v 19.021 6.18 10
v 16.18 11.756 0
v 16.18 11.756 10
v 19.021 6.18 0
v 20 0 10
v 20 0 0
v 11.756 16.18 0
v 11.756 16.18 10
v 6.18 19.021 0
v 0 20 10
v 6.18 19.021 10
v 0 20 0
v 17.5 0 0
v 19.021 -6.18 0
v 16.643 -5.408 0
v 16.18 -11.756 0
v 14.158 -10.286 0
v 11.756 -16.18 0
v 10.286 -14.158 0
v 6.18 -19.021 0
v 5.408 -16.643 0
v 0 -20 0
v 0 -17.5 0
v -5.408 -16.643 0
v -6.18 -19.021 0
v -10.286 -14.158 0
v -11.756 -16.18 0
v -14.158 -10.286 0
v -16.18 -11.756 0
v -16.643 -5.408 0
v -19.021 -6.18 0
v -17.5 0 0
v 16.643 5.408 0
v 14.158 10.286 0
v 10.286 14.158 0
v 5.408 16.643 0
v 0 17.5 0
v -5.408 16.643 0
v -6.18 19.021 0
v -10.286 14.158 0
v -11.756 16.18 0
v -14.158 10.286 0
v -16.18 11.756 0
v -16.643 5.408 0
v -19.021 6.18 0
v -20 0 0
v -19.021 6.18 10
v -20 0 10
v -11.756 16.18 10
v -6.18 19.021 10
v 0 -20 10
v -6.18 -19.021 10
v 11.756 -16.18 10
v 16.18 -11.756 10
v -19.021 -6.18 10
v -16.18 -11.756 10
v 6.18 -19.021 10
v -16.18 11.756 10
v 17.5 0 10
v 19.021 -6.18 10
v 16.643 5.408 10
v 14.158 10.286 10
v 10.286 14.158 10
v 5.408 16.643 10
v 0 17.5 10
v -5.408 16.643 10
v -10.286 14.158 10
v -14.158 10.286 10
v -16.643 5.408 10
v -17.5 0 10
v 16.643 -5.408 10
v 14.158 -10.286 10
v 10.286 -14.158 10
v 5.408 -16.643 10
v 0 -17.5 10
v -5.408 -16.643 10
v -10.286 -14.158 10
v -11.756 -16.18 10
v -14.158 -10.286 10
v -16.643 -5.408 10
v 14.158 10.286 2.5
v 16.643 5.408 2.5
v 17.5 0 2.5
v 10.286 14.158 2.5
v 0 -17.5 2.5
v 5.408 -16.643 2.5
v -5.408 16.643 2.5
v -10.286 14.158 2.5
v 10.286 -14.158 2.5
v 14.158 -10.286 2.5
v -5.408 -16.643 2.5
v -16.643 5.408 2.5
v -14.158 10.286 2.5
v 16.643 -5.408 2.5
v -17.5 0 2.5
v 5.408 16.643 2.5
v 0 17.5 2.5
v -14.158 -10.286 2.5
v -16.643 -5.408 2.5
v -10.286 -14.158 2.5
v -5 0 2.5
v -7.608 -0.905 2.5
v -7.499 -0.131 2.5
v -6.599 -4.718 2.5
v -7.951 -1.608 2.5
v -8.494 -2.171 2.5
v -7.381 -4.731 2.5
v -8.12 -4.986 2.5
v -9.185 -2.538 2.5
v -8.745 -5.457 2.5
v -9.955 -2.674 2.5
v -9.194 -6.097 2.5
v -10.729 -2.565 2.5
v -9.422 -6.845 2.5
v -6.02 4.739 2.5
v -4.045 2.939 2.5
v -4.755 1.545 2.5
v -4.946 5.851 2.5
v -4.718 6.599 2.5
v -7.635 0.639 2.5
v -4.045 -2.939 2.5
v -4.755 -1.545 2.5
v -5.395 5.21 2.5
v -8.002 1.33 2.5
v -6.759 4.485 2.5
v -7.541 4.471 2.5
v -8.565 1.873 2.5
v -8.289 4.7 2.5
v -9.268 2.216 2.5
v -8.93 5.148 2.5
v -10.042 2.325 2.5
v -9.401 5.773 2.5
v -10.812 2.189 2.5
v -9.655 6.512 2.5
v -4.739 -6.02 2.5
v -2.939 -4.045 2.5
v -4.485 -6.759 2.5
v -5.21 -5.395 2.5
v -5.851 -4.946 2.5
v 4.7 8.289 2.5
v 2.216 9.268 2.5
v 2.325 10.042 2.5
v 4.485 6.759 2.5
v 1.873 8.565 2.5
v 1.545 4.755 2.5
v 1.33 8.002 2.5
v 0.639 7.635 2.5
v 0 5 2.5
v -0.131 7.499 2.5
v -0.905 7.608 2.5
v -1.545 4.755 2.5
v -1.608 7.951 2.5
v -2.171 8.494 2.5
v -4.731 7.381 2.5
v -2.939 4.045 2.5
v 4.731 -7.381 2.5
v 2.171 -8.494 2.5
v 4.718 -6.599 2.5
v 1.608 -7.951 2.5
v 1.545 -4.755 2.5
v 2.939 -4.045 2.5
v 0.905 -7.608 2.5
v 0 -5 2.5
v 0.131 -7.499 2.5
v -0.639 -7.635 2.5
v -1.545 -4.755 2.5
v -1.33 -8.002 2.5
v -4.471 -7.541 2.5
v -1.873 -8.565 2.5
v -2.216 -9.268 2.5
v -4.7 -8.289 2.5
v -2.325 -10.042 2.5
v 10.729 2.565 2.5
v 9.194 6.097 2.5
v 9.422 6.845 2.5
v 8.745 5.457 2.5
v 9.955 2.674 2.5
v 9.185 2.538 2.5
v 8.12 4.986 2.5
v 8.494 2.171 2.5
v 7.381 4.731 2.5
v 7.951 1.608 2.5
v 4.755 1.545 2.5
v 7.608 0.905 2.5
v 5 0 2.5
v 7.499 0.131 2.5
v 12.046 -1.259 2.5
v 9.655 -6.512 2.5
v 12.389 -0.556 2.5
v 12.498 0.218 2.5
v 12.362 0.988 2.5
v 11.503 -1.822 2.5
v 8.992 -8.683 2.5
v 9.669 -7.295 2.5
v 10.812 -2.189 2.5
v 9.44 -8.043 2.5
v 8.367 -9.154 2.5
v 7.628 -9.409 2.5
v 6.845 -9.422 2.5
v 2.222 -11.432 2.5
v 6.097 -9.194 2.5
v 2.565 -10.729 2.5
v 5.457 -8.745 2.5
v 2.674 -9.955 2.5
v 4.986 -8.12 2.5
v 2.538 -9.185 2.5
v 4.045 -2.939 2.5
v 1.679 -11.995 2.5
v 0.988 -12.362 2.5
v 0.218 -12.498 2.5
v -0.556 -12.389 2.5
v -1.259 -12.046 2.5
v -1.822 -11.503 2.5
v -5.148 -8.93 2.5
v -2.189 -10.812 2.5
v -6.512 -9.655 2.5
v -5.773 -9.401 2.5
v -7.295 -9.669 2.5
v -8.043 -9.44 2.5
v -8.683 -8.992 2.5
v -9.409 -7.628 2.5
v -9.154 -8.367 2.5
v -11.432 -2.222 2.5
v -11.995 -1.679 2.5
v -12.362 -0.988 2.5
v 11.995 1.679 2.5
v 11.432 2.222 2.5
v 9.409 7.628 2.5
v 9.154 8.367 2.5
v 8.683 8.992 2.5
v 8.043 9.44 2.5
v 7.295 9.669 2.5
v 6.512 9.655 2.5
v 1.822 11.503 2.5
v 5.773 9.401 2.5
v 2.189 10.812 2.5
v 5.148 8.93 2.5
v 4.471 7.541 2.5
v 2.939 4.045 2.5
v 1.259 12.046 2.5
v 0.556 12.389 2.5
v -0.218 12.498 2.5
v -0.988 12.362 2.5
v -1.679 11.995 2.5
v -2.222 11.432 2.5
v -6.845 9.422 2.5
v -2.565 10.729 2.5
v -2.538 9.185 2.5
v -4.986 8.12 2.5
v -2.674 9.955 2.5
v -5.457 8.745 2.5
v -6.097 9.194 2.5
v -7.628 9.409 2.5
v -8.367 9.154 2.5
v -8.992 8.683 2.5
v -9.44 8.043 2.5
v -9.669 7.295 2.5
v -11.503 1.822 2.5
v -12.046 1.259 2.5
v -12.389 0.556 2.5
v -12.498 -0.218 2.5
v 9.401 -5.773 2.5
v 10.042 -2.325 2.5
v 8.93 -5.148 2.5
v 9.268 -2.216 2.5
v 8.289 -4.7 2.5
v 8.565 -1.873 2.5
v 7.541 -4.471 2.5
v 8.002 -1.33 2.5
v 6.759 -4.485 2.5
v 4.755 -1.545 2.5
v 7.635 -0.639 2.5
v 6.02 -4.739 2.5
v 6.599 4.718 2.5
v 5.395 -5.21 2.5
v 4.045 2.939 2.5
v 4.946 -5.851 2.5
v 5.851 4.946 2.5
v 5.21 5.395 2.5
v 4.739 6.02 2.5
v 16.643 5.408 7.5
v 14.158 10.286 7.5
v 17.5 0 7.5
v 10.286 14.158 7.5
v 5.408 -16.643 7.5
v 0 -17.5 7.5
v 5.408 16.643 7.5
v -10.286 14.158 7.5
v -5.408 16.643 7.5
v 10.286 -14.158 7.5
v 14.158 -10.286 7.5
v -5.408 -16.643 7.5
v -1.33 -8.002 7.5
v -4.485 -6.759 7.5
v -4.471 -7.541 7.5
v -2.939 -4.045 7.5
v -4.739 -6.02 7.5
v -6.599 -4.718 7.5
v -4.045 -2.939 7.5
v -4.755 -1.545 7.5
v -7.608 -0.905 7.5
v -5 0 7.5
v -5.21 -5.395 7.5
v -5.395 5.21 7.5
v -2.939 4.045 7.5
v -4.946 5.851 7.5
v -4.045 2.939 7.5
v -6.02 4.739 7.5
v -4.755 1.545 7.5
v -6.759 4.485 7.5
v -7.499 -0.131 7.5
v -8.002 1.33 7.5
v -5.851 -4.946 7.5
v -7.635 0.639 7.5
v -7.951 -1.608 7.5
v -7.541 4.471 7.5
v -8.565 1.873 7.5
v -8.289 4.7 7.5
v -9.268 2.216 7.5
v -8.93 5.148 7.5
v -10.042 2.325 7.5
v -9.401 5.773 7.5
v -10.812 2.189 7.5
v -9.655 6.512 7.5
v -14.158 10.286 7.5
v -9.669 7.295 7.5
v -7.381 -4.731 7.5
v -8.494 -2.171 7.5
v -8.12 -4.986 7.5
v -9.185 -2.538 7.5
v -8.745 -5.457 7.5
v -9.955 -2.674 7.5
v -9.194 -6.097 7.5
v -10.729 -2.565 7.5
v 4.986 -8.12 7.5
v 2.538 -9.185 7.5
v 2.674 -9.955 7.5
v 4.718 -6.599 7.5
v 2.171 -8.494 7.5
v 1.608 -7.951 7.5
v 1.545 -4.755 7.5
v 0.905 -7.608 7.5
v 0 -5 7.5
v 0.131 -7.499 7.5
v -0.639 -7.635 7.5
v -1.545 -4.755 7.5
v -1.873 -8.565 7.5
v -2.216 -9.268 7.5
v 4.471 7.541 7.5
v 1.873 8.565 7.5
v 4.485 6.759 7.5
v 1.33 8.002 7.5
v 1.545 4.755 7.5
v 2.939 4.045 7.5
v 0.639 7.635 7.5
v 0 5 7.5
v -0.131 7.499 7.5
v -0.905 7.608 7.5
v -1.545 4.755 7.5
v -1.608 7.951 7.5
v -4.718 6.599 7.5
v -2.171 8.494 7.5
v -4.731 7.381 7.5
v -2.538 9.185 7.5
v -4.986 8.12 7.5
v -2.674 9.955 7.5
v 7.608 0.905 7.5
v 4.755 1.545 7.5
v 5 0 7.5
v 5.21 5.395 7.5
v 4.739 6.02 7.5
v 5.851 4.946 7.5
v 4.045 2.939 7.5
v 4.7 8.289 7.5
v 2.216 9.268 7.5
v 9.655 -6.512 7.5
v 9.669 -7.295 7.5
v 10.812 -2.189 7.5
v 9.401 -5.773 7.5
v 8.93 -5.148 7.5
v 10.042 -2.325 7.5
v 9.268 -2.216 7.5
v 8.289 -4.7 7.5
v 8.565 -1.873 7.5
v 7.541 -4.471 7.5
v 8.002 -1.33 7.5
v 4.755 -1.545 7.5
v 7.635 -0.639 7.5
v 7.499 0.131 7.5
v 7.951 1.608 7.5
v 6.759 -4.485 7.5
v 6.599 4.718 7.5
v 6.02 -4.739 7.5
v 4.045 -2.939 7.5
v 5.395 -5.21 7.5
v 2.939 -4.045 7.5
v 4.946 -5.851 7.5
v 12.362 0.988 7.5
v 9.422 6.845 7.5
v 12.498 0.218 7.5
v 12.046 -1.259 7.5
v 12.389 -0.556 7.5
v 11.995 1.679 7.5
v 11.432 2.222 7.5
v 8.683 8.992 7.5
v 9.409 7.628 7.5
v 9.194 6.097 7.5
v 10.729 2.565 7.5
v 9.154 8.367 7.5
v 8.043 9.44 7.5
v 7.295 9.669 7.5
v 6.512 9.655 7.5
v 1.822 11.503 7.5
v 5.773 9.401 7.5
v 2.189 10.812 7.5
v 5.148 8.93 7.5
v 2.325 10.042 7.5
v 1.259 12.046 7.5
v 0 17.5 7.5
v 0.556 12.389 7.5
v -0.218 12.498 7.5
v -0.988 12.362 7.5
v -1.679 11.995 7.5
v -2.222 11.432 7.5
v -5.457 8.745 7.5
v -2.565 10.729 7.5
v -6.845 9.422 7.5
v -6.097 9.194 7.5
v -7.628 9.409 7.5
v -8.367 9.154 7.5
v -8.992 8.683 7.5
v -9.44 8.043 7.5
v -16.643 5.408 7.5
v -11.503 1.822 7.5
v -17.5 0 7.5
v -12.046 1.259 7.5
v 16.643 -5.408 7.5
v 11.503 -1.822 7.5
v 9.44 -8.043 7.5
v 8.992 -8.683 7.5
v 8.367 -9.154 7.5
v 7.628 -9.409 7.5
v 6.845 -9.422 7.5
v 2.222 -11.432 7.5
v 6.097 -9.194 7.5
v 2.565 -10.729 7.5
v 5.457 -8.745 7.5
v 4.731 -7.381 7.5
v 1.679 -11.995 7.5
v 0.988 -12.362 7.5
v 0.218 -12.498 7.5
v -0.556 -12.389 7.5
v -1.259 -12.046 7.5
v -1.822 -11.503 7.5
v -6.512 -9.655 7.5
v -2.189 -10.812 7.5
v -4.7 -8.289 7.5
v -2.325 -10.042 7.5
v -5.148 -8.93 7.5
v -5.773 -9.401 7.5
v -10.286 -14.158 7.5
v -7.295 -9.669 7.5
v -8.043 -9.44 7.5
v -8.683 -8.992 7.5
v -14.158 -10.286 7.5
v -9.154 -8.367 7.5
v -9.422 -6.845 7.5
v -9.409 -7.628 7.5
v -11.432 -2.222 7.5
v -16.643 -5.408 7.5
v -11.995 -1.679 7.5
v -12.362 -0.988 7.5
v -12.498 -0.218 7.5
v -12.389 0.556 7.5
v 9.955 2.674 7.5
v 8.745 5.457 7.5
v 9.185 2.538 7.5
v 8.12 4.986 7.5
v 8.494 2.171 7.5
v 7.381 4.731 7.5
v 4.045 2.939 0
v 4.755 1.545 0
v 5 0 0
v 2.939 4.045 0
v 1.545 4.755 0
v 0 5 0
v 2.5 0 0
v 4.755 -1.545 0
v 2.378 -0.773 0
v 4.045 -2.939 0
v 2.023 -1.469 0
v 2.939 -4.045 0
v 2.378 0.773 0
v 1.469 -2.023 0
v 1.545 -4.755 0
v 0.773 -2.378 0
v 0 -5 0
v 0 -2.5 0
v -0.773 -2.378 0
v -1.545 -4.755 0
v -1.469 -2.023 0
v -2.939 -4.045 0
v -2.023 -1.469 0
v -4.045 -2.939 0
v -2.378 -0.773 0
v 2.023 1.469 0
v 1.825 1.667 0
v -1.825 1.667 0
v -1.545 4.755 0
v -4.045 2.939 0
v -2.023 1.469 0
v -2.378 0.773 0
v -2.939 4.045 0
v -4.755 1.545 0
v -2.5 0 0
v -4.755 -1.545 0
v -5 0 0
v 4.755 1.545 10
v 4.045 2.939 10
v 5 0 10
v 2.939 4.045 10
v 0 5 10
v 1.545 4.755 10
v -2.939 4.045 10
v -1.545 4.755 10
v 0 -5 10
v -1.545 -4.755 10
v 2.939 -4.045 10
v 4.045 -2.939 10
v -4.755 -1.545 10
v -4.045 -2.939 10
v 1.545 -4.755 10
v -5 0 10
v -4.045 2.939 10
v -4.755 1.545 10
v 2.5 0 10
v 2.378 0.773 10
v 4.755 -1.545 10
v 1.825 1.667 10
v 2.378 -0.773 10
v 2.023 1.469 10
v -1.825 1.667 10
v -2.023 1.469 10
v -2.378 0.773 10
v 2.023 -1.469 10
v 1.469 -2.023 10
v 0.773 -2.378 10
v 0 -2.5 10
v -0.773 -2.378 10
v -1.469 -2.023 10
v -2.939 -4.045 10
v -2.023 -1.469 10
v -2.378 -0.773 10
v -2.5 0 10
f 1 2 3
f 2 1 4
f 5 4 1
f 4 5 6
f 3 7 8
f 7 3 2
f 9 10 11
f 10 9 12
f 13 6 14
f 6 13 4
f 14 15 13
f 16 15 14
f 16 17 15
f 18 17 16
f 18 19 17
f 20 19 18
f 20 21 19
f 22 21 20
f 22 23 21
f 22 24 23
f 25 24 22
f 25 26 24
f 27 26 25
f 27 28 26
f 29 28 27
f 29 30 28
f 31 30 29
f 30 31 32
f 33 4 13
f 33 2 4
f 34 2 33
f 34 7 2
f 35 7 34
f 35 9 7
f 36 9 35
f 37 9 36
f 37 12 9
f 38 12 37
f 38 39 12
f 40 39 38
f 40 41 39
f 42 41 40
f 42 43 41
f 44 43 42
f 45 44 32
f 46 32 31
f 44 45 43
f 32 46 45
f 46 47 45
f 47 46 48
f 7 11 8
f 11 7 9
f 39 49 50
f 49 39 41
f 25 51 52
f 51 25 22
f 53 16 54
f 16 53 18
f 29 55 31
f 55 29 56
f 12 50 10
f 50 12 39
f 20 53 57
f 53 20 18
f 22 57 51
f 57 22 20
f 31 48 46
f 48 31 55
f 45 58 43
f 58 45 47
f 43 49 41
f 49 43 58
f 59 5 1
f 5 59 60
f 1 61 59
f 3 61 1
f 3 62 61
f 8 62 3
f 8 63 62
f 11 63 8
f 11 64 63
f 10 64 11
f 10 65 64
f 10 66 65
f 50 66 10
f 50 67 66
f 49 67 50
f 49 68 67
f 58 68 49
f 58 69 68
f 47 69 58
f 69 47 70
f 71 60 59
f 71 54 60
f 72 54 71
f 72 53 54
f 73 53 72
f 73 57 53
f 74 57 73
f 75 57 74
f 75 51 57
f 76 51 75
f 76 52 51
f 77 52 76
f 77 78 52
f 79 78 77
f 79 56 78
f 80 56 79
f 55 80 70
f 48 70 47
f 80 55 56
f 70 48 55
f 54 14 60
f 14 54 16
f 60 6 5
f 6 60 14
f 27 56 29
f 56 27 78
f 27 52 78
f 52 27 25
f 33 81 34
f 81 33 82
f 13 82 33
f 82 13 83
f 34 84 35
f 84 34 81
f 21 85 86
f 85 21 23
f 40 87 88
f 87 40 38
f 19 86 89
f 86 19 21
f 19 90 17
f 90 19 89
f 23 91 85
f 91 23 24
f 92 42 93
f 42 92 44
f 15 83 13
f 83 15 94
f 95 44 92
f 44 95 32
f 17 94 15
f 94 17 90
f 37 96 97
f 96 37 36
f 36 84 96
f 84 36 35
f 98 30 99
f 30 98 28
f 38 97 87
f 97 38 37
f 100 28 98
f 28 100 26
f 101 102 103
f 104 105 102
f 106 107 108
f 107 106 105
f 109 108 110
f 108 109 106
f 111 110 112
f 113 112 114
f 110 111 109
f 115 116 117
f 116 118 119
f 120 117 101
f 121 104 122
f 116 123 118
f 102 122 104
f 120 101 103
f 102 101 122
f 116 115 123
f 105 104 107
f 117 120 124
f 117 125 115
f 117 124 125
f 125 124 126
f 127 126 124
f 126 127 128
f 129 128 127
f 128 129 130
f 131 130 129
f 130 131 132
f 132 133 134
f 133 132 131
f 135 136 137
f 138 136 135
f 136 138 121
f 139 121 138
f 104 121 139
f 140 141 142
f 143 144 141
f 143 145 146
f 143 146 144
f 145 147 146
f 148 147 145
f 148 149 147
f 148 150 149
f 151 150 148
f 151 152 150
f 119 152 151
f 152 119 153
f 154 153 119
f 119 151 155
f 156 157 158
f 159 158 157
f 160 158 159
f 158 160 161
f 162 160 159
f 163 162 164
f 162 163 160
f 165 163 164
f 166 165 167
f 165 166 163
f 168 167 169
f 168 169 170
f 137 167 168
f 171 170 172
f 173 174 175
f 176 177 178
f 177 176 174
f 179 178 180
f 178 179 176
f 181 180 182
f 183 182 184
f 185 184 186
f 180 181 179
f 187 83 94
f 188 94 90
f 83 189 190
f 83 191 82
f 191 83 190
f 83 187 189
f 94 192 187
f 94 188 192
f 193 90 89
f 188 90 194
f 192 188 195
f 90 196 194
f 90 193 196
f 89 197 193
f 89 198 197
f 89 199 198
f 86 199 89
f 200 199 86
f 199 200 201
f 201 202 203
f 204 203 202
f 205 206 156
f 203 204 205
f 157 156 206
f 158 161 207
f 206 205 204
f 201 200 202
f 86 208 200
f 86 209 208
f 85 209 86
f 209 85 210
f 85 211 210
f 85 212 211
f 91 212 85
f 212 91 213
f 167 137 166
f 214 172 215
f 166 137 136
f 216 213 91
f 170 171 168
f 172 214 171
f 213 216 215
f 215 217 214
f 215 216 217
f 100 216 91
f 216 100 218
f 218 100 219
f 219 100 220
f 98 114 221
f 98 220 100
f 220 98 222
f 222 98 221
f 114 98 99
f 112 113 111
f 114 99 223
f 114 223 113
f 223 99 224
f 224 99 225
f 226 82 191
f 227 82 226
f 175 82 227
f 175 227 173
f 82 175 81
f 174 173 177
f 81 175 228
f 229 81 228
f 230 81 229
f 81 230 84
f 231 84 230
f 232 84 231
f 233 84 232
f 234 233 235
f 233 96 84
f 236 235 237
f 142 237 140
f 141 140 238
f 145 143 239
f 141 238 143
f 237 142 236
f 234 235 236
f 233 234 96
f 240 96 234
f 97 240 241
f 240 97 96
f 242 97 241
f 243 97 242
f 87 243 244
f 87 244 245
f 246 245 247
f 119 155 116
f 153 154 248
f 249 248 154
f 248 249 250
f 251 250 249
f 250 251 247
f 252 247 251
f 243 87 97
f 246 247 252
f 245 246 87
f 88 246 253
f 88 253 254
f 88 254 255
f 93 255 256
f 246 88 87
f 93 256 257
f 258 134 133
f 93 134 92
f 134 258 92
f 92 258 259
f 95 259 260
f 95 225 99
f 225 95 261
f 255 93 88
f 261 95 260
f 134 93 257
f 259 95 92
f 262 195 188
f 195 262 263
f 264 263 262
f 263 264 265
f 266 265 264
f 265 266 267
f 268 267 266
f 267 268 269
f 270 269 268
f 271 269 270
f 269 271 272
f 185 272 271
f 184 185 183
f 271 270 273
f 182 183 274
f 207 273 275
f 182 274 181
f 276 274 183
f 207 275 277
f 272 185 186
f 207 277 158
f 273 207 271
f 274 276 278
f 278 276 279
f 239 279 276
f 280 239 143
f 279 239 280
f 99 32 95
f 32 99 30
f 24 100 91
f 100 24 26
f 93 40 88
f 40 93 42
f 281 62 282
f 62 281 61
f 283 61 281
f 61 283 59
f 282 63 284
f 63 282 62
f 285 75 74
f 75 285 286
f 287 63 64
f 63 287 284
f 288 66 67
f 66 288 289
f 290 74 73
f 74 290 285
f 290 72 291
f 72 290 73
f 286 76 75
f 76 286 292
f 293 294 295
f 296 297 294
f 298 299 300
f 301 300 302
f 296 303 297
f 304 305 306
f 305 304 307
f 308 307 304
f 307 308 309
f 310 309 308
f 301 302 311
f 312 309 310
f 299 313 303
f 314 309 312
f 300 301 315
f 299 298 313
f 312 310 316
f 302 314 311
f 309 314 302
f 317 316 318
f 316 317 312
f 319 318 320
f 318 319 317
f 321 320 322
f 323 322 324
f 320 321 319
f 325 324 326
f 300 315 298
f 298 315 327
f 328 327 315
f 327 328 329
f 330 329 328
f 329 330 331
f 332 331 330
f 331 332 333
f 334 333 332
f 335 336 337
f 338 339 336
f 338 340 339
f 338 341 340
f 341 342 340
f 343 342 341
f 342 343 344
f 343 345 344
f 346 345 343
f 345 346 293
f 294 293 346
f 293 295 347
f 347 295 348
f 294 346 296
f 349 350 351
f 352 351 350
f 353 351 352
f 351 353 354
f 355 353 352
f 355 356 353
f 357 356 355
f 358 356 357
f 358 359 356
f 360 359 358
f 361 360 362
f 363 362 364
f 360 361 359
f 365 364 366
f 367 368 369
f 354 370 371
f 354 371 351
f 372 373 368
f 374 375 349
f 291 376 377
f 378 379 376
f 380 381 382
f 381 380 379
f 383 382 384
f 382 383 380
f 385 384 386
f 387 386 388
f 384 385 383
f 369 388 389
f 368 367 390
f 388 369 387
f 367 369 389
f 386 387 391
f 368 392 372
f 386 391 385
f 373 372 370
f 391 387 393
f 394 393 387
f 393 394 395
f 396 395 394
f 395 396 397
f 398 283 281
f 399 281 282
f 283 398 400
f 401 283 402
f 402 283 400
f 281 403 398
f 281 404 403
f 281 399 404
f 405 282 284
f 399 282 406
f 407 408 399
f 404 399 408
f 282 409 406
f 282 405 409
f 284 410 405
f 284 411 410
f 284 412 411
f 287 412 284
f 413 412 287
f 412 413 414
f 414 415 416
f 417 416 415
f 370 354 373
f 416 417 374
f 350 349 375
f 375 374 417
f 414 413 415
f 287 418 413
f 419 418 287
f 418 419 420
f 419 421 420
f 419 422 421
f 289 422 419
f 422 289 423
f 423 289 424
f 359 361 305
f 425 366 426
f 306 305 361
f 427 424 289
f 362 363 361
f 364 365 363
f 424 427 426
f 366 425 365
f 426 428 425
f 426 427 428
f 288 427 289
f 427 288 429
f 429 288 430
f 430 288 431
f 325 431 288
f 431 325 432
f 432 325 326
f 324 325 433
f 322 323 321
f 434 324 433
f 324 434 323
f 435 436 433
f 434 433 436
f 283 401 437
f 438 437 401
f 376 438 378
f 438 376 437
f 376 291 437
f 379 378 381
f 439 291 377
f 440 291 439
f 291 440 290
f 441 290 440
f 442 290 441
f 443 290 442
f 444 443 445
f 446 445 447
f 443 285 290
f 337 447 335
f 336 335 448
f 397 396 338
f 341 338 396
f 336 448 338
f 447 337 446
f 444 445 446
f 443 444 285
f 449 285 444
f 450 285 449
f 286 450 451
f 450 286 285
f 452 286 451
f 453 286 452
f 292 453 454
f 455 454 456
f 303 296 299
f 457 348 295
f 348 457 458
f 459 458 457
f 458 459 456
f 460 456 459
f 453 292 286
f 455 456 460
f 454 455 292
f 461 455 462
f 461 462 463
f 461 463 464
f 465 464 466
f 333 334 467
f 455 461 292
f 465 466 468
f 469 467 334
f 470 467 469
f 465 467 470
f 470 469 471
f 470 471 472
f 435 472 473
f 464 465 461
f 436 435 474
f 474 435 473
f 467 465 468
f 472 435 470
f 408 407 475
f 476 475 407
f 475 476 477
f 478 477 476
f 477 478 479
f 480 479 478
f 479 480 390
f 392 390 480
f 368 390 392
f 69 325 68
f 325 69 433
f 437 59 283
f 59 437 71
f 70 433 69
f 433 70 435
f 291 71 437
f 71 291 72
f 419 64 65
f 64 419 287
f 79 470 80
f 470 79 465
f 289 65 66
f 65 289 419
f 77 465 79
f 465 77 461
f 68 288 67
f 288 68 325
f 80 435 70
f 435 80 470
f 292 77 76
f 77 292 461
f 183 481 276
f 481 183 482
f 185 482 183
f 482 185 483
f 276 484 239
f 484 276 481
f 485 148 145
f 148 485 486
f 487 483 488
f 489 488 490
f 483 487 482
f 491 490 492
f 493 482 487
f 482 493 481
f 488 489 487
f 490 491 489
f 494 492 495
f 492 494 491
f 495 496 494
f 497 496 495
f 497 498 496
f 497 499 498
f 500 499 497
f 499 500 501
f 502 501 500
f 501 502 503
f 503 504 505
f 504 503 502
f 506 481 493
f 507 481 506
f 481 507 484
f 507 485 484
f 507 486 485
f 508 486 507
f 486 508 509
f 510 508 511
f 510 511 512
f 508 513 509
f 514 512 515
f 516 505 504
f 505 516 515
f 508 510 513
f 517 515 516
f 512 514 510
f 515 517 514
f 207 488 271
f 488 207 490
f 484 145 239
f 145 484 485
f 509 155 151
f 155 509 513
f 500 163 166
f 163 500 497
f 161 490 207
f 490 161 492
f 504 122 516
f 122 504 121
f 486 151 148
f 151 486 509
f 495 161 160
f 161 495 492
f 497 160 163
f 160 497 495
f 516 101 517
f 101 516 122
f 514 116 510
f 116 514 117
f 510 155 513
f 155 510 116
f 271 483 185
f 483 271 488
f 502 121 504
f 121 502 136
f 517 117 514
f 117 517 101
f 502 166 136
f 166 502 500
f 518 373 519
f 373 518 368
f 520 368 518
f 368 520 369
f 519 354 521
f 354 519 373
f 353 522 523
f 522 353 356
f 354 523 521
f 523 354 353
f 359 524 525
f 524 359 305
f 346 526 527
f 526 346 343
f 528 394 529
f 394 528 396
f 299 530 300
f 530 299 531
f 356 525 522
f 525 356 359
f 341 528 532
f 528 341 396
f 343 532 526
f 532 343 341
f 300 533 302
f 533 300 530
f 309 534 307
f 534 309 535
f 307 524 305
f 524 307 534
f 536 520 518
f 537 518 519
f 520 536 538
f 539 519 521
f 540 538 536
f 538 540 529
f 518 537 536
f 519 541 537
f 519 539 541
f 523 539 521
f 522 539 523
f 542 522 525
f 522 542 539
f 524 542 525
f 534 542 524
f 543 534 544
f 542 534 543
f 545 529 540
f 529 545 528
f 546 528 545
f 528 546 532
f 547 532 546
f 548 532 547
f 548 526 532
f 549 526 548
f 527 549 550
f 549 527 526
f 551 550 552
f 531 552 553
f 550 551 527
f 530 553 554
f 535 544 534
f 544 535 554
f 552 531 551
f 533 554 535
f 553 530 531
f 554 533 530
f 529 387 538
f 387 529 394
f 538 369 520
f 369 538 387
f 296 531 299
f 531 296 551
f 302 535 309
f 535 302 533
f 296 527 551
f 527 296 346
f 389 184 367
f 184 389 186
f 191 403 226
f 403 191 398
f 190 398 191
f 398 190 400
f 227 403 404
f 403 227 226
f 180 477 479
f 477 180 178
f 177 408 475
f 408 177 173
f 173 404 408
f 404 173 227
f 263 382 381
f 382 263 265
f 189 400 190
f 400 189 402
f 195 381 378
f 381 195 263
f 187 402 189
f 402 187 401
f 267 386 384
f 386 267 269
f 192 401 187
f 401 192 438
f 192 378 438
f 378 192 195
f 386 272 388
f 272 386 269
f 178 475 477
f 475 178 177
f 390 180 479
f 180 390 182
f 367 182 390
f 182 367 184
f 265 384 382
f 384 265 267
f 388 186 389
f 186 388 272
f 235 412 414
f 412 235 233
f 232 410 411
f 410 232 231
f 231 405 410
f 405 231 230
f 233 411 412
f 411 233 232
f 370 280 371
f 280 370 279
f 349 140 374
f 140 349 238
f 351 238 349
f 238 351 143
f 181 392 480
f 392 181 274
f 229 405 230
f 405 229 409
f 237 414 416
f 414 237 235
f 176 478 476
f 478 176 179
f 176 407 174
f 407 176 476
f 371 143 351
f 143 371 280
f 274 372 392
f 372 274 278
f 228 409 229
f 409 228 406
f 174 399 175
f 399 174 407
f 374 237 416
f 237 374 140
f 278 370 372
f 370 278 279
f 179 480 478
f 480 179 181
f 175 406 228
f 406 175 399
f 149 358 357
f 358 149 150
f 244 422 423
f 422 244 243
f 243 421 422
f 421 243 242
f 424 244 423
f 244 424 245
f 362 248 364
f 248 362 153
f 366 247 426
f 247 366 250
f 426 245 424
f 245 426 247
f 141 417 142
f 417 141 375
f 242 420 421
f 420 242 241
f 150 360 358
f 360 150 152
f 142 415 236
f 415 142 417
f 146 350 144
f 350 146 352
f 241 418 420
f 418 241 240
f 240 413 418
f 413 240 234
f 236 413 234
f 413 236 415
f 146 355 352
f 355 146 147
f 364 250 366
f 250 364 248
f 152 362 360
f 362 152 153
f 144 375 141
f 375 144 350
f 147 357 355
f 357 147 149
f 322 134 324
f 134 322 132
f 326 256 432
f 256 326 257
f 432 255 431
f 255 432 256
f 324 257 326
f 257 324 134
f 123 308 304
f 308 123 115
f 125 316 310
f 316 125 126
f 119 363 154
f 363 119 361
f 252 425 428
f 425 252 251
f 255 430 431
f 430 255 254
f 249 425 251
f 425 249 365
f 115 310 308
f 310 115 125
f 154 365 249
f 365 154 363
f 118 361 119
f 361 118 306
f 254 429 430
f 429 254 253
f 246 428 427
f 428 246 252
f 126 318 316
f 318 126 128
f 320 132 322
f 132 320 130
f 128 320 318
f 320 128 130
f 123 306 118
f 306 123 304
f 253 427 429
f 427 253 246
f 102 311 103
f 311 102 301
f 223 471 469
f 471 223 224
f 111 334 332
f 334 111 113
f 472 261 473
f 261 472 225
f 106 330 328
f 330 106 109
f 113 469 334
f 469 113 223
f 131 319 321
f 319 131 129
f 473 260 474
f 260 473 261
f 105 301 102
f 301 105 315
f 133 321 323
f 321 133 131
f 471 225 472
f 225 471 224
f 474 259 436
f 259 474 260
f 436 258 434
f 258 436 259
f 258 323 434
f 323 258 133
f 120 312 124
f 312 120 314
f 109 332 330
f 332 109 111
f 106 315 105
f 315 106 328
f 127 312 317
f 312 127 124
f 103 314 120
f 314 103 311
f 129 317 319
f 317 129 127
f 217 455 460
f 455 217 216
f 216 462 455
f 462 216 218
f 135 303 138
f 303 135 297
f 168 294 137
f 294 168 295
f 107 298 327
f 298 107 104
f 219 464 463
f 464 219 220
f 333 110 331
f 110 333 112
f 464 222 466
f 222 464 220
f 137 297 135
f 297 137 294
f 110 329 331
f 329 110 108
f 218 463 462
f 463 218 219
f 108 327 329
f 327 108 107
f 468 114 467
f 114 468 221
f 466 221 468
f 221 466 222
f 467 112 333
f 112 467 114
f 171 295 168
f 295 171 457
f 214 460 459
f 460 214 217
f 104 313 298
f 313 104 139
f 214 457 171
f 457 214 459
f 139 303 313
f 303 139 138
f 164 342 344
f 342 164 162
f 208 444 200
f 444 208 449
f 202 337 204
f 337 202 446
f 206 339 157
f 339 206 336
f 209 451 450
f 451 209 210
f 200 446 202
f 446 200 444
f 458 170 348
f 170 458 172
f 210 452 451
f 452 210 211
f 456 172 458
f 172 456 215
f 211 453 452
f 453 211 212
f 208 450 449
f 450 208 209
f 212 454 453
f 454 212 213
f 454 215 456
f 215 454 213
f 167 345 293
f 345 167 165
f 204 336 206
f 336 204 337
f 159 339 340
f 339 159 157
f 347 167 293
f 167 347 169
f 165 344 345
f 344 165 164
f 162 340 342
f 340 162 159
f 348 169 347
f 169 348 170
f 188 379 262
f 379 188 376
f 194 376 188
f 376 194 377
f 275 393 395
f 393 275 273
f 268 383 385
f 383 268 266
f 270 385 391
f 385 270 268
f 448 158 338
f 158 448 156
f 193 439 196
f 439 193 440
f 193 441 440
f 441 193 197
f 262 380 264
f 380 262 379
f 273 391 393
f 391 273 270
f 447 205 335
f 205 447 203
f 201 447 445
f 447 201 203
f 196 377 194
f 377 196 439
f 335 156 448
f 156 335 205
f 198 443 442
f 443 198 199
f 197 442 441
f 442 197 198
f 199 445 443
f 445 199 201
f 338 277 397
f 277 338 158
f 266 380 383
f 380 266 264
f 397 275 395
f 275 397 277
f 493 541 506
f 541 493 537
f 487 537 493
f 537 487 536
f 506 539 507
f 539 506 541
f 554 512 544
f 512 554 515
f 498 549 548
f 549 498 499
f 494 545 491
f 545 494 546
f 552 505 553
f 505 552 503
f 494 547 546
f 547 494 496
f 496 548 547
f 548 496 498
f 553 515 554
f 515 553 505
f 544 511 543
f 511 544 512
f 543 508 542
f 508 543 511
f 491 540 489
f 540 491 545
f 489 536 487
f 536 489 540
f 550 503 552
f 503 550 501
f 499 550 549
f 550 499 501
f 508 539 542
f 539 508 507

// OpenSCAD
//20W

//variables
dExterior = 40;
hExterior = 10;

dMedio = 35;
hMedio = 2.5;

dCentro = 10;
hCentro = 2.5;

//holes
dHoles = 5;
hHoles = hExterior*2;
number_of_holes = 8;

//liston
xListon = 5;
yListon = 1;
zListon = hExterior;

//modules
module body3(){
    union(){
        difference(){
            wheelBase();
            holes();
            center();
        }
        translate([-xListon/2,dHoles/3,0])
            cube([xListon,yListon,zListon]);
    }
}

module wheelBase(){
    union(){
        difference(){
            cylinder(h=hExterior,d=dExterior,$fn=20);
            cylinder(h=hMedio,d=dMedio,$fn=20);
            translate([0,0,hExterior-hMedio])
                cylinder(h=hMedio,d=dMedio,$fn=20);
        }
        cylinder(h=hCentro,d=dCentro,$fn=20);
        translate([0,0,hExterior-hCentro])
            cylinder(h=hCentro,d=dCentro,$fn=20);
    }
}

module holes(){
    for(i = [1 : 360 / number_of_holes : 360]) {
        make_cylinder(i);
}

module make_cylinder(i) {
    rotate([0, 0, i]) 
        translate([10, 0, 0]) 
            cylinder(h=hHoles, d=dHoles, center=true, $fn=20);
    }
}

module center(){
    cylinder(h=hHoles, d=dHoles, center=true, $fn=20);
}

body3();
